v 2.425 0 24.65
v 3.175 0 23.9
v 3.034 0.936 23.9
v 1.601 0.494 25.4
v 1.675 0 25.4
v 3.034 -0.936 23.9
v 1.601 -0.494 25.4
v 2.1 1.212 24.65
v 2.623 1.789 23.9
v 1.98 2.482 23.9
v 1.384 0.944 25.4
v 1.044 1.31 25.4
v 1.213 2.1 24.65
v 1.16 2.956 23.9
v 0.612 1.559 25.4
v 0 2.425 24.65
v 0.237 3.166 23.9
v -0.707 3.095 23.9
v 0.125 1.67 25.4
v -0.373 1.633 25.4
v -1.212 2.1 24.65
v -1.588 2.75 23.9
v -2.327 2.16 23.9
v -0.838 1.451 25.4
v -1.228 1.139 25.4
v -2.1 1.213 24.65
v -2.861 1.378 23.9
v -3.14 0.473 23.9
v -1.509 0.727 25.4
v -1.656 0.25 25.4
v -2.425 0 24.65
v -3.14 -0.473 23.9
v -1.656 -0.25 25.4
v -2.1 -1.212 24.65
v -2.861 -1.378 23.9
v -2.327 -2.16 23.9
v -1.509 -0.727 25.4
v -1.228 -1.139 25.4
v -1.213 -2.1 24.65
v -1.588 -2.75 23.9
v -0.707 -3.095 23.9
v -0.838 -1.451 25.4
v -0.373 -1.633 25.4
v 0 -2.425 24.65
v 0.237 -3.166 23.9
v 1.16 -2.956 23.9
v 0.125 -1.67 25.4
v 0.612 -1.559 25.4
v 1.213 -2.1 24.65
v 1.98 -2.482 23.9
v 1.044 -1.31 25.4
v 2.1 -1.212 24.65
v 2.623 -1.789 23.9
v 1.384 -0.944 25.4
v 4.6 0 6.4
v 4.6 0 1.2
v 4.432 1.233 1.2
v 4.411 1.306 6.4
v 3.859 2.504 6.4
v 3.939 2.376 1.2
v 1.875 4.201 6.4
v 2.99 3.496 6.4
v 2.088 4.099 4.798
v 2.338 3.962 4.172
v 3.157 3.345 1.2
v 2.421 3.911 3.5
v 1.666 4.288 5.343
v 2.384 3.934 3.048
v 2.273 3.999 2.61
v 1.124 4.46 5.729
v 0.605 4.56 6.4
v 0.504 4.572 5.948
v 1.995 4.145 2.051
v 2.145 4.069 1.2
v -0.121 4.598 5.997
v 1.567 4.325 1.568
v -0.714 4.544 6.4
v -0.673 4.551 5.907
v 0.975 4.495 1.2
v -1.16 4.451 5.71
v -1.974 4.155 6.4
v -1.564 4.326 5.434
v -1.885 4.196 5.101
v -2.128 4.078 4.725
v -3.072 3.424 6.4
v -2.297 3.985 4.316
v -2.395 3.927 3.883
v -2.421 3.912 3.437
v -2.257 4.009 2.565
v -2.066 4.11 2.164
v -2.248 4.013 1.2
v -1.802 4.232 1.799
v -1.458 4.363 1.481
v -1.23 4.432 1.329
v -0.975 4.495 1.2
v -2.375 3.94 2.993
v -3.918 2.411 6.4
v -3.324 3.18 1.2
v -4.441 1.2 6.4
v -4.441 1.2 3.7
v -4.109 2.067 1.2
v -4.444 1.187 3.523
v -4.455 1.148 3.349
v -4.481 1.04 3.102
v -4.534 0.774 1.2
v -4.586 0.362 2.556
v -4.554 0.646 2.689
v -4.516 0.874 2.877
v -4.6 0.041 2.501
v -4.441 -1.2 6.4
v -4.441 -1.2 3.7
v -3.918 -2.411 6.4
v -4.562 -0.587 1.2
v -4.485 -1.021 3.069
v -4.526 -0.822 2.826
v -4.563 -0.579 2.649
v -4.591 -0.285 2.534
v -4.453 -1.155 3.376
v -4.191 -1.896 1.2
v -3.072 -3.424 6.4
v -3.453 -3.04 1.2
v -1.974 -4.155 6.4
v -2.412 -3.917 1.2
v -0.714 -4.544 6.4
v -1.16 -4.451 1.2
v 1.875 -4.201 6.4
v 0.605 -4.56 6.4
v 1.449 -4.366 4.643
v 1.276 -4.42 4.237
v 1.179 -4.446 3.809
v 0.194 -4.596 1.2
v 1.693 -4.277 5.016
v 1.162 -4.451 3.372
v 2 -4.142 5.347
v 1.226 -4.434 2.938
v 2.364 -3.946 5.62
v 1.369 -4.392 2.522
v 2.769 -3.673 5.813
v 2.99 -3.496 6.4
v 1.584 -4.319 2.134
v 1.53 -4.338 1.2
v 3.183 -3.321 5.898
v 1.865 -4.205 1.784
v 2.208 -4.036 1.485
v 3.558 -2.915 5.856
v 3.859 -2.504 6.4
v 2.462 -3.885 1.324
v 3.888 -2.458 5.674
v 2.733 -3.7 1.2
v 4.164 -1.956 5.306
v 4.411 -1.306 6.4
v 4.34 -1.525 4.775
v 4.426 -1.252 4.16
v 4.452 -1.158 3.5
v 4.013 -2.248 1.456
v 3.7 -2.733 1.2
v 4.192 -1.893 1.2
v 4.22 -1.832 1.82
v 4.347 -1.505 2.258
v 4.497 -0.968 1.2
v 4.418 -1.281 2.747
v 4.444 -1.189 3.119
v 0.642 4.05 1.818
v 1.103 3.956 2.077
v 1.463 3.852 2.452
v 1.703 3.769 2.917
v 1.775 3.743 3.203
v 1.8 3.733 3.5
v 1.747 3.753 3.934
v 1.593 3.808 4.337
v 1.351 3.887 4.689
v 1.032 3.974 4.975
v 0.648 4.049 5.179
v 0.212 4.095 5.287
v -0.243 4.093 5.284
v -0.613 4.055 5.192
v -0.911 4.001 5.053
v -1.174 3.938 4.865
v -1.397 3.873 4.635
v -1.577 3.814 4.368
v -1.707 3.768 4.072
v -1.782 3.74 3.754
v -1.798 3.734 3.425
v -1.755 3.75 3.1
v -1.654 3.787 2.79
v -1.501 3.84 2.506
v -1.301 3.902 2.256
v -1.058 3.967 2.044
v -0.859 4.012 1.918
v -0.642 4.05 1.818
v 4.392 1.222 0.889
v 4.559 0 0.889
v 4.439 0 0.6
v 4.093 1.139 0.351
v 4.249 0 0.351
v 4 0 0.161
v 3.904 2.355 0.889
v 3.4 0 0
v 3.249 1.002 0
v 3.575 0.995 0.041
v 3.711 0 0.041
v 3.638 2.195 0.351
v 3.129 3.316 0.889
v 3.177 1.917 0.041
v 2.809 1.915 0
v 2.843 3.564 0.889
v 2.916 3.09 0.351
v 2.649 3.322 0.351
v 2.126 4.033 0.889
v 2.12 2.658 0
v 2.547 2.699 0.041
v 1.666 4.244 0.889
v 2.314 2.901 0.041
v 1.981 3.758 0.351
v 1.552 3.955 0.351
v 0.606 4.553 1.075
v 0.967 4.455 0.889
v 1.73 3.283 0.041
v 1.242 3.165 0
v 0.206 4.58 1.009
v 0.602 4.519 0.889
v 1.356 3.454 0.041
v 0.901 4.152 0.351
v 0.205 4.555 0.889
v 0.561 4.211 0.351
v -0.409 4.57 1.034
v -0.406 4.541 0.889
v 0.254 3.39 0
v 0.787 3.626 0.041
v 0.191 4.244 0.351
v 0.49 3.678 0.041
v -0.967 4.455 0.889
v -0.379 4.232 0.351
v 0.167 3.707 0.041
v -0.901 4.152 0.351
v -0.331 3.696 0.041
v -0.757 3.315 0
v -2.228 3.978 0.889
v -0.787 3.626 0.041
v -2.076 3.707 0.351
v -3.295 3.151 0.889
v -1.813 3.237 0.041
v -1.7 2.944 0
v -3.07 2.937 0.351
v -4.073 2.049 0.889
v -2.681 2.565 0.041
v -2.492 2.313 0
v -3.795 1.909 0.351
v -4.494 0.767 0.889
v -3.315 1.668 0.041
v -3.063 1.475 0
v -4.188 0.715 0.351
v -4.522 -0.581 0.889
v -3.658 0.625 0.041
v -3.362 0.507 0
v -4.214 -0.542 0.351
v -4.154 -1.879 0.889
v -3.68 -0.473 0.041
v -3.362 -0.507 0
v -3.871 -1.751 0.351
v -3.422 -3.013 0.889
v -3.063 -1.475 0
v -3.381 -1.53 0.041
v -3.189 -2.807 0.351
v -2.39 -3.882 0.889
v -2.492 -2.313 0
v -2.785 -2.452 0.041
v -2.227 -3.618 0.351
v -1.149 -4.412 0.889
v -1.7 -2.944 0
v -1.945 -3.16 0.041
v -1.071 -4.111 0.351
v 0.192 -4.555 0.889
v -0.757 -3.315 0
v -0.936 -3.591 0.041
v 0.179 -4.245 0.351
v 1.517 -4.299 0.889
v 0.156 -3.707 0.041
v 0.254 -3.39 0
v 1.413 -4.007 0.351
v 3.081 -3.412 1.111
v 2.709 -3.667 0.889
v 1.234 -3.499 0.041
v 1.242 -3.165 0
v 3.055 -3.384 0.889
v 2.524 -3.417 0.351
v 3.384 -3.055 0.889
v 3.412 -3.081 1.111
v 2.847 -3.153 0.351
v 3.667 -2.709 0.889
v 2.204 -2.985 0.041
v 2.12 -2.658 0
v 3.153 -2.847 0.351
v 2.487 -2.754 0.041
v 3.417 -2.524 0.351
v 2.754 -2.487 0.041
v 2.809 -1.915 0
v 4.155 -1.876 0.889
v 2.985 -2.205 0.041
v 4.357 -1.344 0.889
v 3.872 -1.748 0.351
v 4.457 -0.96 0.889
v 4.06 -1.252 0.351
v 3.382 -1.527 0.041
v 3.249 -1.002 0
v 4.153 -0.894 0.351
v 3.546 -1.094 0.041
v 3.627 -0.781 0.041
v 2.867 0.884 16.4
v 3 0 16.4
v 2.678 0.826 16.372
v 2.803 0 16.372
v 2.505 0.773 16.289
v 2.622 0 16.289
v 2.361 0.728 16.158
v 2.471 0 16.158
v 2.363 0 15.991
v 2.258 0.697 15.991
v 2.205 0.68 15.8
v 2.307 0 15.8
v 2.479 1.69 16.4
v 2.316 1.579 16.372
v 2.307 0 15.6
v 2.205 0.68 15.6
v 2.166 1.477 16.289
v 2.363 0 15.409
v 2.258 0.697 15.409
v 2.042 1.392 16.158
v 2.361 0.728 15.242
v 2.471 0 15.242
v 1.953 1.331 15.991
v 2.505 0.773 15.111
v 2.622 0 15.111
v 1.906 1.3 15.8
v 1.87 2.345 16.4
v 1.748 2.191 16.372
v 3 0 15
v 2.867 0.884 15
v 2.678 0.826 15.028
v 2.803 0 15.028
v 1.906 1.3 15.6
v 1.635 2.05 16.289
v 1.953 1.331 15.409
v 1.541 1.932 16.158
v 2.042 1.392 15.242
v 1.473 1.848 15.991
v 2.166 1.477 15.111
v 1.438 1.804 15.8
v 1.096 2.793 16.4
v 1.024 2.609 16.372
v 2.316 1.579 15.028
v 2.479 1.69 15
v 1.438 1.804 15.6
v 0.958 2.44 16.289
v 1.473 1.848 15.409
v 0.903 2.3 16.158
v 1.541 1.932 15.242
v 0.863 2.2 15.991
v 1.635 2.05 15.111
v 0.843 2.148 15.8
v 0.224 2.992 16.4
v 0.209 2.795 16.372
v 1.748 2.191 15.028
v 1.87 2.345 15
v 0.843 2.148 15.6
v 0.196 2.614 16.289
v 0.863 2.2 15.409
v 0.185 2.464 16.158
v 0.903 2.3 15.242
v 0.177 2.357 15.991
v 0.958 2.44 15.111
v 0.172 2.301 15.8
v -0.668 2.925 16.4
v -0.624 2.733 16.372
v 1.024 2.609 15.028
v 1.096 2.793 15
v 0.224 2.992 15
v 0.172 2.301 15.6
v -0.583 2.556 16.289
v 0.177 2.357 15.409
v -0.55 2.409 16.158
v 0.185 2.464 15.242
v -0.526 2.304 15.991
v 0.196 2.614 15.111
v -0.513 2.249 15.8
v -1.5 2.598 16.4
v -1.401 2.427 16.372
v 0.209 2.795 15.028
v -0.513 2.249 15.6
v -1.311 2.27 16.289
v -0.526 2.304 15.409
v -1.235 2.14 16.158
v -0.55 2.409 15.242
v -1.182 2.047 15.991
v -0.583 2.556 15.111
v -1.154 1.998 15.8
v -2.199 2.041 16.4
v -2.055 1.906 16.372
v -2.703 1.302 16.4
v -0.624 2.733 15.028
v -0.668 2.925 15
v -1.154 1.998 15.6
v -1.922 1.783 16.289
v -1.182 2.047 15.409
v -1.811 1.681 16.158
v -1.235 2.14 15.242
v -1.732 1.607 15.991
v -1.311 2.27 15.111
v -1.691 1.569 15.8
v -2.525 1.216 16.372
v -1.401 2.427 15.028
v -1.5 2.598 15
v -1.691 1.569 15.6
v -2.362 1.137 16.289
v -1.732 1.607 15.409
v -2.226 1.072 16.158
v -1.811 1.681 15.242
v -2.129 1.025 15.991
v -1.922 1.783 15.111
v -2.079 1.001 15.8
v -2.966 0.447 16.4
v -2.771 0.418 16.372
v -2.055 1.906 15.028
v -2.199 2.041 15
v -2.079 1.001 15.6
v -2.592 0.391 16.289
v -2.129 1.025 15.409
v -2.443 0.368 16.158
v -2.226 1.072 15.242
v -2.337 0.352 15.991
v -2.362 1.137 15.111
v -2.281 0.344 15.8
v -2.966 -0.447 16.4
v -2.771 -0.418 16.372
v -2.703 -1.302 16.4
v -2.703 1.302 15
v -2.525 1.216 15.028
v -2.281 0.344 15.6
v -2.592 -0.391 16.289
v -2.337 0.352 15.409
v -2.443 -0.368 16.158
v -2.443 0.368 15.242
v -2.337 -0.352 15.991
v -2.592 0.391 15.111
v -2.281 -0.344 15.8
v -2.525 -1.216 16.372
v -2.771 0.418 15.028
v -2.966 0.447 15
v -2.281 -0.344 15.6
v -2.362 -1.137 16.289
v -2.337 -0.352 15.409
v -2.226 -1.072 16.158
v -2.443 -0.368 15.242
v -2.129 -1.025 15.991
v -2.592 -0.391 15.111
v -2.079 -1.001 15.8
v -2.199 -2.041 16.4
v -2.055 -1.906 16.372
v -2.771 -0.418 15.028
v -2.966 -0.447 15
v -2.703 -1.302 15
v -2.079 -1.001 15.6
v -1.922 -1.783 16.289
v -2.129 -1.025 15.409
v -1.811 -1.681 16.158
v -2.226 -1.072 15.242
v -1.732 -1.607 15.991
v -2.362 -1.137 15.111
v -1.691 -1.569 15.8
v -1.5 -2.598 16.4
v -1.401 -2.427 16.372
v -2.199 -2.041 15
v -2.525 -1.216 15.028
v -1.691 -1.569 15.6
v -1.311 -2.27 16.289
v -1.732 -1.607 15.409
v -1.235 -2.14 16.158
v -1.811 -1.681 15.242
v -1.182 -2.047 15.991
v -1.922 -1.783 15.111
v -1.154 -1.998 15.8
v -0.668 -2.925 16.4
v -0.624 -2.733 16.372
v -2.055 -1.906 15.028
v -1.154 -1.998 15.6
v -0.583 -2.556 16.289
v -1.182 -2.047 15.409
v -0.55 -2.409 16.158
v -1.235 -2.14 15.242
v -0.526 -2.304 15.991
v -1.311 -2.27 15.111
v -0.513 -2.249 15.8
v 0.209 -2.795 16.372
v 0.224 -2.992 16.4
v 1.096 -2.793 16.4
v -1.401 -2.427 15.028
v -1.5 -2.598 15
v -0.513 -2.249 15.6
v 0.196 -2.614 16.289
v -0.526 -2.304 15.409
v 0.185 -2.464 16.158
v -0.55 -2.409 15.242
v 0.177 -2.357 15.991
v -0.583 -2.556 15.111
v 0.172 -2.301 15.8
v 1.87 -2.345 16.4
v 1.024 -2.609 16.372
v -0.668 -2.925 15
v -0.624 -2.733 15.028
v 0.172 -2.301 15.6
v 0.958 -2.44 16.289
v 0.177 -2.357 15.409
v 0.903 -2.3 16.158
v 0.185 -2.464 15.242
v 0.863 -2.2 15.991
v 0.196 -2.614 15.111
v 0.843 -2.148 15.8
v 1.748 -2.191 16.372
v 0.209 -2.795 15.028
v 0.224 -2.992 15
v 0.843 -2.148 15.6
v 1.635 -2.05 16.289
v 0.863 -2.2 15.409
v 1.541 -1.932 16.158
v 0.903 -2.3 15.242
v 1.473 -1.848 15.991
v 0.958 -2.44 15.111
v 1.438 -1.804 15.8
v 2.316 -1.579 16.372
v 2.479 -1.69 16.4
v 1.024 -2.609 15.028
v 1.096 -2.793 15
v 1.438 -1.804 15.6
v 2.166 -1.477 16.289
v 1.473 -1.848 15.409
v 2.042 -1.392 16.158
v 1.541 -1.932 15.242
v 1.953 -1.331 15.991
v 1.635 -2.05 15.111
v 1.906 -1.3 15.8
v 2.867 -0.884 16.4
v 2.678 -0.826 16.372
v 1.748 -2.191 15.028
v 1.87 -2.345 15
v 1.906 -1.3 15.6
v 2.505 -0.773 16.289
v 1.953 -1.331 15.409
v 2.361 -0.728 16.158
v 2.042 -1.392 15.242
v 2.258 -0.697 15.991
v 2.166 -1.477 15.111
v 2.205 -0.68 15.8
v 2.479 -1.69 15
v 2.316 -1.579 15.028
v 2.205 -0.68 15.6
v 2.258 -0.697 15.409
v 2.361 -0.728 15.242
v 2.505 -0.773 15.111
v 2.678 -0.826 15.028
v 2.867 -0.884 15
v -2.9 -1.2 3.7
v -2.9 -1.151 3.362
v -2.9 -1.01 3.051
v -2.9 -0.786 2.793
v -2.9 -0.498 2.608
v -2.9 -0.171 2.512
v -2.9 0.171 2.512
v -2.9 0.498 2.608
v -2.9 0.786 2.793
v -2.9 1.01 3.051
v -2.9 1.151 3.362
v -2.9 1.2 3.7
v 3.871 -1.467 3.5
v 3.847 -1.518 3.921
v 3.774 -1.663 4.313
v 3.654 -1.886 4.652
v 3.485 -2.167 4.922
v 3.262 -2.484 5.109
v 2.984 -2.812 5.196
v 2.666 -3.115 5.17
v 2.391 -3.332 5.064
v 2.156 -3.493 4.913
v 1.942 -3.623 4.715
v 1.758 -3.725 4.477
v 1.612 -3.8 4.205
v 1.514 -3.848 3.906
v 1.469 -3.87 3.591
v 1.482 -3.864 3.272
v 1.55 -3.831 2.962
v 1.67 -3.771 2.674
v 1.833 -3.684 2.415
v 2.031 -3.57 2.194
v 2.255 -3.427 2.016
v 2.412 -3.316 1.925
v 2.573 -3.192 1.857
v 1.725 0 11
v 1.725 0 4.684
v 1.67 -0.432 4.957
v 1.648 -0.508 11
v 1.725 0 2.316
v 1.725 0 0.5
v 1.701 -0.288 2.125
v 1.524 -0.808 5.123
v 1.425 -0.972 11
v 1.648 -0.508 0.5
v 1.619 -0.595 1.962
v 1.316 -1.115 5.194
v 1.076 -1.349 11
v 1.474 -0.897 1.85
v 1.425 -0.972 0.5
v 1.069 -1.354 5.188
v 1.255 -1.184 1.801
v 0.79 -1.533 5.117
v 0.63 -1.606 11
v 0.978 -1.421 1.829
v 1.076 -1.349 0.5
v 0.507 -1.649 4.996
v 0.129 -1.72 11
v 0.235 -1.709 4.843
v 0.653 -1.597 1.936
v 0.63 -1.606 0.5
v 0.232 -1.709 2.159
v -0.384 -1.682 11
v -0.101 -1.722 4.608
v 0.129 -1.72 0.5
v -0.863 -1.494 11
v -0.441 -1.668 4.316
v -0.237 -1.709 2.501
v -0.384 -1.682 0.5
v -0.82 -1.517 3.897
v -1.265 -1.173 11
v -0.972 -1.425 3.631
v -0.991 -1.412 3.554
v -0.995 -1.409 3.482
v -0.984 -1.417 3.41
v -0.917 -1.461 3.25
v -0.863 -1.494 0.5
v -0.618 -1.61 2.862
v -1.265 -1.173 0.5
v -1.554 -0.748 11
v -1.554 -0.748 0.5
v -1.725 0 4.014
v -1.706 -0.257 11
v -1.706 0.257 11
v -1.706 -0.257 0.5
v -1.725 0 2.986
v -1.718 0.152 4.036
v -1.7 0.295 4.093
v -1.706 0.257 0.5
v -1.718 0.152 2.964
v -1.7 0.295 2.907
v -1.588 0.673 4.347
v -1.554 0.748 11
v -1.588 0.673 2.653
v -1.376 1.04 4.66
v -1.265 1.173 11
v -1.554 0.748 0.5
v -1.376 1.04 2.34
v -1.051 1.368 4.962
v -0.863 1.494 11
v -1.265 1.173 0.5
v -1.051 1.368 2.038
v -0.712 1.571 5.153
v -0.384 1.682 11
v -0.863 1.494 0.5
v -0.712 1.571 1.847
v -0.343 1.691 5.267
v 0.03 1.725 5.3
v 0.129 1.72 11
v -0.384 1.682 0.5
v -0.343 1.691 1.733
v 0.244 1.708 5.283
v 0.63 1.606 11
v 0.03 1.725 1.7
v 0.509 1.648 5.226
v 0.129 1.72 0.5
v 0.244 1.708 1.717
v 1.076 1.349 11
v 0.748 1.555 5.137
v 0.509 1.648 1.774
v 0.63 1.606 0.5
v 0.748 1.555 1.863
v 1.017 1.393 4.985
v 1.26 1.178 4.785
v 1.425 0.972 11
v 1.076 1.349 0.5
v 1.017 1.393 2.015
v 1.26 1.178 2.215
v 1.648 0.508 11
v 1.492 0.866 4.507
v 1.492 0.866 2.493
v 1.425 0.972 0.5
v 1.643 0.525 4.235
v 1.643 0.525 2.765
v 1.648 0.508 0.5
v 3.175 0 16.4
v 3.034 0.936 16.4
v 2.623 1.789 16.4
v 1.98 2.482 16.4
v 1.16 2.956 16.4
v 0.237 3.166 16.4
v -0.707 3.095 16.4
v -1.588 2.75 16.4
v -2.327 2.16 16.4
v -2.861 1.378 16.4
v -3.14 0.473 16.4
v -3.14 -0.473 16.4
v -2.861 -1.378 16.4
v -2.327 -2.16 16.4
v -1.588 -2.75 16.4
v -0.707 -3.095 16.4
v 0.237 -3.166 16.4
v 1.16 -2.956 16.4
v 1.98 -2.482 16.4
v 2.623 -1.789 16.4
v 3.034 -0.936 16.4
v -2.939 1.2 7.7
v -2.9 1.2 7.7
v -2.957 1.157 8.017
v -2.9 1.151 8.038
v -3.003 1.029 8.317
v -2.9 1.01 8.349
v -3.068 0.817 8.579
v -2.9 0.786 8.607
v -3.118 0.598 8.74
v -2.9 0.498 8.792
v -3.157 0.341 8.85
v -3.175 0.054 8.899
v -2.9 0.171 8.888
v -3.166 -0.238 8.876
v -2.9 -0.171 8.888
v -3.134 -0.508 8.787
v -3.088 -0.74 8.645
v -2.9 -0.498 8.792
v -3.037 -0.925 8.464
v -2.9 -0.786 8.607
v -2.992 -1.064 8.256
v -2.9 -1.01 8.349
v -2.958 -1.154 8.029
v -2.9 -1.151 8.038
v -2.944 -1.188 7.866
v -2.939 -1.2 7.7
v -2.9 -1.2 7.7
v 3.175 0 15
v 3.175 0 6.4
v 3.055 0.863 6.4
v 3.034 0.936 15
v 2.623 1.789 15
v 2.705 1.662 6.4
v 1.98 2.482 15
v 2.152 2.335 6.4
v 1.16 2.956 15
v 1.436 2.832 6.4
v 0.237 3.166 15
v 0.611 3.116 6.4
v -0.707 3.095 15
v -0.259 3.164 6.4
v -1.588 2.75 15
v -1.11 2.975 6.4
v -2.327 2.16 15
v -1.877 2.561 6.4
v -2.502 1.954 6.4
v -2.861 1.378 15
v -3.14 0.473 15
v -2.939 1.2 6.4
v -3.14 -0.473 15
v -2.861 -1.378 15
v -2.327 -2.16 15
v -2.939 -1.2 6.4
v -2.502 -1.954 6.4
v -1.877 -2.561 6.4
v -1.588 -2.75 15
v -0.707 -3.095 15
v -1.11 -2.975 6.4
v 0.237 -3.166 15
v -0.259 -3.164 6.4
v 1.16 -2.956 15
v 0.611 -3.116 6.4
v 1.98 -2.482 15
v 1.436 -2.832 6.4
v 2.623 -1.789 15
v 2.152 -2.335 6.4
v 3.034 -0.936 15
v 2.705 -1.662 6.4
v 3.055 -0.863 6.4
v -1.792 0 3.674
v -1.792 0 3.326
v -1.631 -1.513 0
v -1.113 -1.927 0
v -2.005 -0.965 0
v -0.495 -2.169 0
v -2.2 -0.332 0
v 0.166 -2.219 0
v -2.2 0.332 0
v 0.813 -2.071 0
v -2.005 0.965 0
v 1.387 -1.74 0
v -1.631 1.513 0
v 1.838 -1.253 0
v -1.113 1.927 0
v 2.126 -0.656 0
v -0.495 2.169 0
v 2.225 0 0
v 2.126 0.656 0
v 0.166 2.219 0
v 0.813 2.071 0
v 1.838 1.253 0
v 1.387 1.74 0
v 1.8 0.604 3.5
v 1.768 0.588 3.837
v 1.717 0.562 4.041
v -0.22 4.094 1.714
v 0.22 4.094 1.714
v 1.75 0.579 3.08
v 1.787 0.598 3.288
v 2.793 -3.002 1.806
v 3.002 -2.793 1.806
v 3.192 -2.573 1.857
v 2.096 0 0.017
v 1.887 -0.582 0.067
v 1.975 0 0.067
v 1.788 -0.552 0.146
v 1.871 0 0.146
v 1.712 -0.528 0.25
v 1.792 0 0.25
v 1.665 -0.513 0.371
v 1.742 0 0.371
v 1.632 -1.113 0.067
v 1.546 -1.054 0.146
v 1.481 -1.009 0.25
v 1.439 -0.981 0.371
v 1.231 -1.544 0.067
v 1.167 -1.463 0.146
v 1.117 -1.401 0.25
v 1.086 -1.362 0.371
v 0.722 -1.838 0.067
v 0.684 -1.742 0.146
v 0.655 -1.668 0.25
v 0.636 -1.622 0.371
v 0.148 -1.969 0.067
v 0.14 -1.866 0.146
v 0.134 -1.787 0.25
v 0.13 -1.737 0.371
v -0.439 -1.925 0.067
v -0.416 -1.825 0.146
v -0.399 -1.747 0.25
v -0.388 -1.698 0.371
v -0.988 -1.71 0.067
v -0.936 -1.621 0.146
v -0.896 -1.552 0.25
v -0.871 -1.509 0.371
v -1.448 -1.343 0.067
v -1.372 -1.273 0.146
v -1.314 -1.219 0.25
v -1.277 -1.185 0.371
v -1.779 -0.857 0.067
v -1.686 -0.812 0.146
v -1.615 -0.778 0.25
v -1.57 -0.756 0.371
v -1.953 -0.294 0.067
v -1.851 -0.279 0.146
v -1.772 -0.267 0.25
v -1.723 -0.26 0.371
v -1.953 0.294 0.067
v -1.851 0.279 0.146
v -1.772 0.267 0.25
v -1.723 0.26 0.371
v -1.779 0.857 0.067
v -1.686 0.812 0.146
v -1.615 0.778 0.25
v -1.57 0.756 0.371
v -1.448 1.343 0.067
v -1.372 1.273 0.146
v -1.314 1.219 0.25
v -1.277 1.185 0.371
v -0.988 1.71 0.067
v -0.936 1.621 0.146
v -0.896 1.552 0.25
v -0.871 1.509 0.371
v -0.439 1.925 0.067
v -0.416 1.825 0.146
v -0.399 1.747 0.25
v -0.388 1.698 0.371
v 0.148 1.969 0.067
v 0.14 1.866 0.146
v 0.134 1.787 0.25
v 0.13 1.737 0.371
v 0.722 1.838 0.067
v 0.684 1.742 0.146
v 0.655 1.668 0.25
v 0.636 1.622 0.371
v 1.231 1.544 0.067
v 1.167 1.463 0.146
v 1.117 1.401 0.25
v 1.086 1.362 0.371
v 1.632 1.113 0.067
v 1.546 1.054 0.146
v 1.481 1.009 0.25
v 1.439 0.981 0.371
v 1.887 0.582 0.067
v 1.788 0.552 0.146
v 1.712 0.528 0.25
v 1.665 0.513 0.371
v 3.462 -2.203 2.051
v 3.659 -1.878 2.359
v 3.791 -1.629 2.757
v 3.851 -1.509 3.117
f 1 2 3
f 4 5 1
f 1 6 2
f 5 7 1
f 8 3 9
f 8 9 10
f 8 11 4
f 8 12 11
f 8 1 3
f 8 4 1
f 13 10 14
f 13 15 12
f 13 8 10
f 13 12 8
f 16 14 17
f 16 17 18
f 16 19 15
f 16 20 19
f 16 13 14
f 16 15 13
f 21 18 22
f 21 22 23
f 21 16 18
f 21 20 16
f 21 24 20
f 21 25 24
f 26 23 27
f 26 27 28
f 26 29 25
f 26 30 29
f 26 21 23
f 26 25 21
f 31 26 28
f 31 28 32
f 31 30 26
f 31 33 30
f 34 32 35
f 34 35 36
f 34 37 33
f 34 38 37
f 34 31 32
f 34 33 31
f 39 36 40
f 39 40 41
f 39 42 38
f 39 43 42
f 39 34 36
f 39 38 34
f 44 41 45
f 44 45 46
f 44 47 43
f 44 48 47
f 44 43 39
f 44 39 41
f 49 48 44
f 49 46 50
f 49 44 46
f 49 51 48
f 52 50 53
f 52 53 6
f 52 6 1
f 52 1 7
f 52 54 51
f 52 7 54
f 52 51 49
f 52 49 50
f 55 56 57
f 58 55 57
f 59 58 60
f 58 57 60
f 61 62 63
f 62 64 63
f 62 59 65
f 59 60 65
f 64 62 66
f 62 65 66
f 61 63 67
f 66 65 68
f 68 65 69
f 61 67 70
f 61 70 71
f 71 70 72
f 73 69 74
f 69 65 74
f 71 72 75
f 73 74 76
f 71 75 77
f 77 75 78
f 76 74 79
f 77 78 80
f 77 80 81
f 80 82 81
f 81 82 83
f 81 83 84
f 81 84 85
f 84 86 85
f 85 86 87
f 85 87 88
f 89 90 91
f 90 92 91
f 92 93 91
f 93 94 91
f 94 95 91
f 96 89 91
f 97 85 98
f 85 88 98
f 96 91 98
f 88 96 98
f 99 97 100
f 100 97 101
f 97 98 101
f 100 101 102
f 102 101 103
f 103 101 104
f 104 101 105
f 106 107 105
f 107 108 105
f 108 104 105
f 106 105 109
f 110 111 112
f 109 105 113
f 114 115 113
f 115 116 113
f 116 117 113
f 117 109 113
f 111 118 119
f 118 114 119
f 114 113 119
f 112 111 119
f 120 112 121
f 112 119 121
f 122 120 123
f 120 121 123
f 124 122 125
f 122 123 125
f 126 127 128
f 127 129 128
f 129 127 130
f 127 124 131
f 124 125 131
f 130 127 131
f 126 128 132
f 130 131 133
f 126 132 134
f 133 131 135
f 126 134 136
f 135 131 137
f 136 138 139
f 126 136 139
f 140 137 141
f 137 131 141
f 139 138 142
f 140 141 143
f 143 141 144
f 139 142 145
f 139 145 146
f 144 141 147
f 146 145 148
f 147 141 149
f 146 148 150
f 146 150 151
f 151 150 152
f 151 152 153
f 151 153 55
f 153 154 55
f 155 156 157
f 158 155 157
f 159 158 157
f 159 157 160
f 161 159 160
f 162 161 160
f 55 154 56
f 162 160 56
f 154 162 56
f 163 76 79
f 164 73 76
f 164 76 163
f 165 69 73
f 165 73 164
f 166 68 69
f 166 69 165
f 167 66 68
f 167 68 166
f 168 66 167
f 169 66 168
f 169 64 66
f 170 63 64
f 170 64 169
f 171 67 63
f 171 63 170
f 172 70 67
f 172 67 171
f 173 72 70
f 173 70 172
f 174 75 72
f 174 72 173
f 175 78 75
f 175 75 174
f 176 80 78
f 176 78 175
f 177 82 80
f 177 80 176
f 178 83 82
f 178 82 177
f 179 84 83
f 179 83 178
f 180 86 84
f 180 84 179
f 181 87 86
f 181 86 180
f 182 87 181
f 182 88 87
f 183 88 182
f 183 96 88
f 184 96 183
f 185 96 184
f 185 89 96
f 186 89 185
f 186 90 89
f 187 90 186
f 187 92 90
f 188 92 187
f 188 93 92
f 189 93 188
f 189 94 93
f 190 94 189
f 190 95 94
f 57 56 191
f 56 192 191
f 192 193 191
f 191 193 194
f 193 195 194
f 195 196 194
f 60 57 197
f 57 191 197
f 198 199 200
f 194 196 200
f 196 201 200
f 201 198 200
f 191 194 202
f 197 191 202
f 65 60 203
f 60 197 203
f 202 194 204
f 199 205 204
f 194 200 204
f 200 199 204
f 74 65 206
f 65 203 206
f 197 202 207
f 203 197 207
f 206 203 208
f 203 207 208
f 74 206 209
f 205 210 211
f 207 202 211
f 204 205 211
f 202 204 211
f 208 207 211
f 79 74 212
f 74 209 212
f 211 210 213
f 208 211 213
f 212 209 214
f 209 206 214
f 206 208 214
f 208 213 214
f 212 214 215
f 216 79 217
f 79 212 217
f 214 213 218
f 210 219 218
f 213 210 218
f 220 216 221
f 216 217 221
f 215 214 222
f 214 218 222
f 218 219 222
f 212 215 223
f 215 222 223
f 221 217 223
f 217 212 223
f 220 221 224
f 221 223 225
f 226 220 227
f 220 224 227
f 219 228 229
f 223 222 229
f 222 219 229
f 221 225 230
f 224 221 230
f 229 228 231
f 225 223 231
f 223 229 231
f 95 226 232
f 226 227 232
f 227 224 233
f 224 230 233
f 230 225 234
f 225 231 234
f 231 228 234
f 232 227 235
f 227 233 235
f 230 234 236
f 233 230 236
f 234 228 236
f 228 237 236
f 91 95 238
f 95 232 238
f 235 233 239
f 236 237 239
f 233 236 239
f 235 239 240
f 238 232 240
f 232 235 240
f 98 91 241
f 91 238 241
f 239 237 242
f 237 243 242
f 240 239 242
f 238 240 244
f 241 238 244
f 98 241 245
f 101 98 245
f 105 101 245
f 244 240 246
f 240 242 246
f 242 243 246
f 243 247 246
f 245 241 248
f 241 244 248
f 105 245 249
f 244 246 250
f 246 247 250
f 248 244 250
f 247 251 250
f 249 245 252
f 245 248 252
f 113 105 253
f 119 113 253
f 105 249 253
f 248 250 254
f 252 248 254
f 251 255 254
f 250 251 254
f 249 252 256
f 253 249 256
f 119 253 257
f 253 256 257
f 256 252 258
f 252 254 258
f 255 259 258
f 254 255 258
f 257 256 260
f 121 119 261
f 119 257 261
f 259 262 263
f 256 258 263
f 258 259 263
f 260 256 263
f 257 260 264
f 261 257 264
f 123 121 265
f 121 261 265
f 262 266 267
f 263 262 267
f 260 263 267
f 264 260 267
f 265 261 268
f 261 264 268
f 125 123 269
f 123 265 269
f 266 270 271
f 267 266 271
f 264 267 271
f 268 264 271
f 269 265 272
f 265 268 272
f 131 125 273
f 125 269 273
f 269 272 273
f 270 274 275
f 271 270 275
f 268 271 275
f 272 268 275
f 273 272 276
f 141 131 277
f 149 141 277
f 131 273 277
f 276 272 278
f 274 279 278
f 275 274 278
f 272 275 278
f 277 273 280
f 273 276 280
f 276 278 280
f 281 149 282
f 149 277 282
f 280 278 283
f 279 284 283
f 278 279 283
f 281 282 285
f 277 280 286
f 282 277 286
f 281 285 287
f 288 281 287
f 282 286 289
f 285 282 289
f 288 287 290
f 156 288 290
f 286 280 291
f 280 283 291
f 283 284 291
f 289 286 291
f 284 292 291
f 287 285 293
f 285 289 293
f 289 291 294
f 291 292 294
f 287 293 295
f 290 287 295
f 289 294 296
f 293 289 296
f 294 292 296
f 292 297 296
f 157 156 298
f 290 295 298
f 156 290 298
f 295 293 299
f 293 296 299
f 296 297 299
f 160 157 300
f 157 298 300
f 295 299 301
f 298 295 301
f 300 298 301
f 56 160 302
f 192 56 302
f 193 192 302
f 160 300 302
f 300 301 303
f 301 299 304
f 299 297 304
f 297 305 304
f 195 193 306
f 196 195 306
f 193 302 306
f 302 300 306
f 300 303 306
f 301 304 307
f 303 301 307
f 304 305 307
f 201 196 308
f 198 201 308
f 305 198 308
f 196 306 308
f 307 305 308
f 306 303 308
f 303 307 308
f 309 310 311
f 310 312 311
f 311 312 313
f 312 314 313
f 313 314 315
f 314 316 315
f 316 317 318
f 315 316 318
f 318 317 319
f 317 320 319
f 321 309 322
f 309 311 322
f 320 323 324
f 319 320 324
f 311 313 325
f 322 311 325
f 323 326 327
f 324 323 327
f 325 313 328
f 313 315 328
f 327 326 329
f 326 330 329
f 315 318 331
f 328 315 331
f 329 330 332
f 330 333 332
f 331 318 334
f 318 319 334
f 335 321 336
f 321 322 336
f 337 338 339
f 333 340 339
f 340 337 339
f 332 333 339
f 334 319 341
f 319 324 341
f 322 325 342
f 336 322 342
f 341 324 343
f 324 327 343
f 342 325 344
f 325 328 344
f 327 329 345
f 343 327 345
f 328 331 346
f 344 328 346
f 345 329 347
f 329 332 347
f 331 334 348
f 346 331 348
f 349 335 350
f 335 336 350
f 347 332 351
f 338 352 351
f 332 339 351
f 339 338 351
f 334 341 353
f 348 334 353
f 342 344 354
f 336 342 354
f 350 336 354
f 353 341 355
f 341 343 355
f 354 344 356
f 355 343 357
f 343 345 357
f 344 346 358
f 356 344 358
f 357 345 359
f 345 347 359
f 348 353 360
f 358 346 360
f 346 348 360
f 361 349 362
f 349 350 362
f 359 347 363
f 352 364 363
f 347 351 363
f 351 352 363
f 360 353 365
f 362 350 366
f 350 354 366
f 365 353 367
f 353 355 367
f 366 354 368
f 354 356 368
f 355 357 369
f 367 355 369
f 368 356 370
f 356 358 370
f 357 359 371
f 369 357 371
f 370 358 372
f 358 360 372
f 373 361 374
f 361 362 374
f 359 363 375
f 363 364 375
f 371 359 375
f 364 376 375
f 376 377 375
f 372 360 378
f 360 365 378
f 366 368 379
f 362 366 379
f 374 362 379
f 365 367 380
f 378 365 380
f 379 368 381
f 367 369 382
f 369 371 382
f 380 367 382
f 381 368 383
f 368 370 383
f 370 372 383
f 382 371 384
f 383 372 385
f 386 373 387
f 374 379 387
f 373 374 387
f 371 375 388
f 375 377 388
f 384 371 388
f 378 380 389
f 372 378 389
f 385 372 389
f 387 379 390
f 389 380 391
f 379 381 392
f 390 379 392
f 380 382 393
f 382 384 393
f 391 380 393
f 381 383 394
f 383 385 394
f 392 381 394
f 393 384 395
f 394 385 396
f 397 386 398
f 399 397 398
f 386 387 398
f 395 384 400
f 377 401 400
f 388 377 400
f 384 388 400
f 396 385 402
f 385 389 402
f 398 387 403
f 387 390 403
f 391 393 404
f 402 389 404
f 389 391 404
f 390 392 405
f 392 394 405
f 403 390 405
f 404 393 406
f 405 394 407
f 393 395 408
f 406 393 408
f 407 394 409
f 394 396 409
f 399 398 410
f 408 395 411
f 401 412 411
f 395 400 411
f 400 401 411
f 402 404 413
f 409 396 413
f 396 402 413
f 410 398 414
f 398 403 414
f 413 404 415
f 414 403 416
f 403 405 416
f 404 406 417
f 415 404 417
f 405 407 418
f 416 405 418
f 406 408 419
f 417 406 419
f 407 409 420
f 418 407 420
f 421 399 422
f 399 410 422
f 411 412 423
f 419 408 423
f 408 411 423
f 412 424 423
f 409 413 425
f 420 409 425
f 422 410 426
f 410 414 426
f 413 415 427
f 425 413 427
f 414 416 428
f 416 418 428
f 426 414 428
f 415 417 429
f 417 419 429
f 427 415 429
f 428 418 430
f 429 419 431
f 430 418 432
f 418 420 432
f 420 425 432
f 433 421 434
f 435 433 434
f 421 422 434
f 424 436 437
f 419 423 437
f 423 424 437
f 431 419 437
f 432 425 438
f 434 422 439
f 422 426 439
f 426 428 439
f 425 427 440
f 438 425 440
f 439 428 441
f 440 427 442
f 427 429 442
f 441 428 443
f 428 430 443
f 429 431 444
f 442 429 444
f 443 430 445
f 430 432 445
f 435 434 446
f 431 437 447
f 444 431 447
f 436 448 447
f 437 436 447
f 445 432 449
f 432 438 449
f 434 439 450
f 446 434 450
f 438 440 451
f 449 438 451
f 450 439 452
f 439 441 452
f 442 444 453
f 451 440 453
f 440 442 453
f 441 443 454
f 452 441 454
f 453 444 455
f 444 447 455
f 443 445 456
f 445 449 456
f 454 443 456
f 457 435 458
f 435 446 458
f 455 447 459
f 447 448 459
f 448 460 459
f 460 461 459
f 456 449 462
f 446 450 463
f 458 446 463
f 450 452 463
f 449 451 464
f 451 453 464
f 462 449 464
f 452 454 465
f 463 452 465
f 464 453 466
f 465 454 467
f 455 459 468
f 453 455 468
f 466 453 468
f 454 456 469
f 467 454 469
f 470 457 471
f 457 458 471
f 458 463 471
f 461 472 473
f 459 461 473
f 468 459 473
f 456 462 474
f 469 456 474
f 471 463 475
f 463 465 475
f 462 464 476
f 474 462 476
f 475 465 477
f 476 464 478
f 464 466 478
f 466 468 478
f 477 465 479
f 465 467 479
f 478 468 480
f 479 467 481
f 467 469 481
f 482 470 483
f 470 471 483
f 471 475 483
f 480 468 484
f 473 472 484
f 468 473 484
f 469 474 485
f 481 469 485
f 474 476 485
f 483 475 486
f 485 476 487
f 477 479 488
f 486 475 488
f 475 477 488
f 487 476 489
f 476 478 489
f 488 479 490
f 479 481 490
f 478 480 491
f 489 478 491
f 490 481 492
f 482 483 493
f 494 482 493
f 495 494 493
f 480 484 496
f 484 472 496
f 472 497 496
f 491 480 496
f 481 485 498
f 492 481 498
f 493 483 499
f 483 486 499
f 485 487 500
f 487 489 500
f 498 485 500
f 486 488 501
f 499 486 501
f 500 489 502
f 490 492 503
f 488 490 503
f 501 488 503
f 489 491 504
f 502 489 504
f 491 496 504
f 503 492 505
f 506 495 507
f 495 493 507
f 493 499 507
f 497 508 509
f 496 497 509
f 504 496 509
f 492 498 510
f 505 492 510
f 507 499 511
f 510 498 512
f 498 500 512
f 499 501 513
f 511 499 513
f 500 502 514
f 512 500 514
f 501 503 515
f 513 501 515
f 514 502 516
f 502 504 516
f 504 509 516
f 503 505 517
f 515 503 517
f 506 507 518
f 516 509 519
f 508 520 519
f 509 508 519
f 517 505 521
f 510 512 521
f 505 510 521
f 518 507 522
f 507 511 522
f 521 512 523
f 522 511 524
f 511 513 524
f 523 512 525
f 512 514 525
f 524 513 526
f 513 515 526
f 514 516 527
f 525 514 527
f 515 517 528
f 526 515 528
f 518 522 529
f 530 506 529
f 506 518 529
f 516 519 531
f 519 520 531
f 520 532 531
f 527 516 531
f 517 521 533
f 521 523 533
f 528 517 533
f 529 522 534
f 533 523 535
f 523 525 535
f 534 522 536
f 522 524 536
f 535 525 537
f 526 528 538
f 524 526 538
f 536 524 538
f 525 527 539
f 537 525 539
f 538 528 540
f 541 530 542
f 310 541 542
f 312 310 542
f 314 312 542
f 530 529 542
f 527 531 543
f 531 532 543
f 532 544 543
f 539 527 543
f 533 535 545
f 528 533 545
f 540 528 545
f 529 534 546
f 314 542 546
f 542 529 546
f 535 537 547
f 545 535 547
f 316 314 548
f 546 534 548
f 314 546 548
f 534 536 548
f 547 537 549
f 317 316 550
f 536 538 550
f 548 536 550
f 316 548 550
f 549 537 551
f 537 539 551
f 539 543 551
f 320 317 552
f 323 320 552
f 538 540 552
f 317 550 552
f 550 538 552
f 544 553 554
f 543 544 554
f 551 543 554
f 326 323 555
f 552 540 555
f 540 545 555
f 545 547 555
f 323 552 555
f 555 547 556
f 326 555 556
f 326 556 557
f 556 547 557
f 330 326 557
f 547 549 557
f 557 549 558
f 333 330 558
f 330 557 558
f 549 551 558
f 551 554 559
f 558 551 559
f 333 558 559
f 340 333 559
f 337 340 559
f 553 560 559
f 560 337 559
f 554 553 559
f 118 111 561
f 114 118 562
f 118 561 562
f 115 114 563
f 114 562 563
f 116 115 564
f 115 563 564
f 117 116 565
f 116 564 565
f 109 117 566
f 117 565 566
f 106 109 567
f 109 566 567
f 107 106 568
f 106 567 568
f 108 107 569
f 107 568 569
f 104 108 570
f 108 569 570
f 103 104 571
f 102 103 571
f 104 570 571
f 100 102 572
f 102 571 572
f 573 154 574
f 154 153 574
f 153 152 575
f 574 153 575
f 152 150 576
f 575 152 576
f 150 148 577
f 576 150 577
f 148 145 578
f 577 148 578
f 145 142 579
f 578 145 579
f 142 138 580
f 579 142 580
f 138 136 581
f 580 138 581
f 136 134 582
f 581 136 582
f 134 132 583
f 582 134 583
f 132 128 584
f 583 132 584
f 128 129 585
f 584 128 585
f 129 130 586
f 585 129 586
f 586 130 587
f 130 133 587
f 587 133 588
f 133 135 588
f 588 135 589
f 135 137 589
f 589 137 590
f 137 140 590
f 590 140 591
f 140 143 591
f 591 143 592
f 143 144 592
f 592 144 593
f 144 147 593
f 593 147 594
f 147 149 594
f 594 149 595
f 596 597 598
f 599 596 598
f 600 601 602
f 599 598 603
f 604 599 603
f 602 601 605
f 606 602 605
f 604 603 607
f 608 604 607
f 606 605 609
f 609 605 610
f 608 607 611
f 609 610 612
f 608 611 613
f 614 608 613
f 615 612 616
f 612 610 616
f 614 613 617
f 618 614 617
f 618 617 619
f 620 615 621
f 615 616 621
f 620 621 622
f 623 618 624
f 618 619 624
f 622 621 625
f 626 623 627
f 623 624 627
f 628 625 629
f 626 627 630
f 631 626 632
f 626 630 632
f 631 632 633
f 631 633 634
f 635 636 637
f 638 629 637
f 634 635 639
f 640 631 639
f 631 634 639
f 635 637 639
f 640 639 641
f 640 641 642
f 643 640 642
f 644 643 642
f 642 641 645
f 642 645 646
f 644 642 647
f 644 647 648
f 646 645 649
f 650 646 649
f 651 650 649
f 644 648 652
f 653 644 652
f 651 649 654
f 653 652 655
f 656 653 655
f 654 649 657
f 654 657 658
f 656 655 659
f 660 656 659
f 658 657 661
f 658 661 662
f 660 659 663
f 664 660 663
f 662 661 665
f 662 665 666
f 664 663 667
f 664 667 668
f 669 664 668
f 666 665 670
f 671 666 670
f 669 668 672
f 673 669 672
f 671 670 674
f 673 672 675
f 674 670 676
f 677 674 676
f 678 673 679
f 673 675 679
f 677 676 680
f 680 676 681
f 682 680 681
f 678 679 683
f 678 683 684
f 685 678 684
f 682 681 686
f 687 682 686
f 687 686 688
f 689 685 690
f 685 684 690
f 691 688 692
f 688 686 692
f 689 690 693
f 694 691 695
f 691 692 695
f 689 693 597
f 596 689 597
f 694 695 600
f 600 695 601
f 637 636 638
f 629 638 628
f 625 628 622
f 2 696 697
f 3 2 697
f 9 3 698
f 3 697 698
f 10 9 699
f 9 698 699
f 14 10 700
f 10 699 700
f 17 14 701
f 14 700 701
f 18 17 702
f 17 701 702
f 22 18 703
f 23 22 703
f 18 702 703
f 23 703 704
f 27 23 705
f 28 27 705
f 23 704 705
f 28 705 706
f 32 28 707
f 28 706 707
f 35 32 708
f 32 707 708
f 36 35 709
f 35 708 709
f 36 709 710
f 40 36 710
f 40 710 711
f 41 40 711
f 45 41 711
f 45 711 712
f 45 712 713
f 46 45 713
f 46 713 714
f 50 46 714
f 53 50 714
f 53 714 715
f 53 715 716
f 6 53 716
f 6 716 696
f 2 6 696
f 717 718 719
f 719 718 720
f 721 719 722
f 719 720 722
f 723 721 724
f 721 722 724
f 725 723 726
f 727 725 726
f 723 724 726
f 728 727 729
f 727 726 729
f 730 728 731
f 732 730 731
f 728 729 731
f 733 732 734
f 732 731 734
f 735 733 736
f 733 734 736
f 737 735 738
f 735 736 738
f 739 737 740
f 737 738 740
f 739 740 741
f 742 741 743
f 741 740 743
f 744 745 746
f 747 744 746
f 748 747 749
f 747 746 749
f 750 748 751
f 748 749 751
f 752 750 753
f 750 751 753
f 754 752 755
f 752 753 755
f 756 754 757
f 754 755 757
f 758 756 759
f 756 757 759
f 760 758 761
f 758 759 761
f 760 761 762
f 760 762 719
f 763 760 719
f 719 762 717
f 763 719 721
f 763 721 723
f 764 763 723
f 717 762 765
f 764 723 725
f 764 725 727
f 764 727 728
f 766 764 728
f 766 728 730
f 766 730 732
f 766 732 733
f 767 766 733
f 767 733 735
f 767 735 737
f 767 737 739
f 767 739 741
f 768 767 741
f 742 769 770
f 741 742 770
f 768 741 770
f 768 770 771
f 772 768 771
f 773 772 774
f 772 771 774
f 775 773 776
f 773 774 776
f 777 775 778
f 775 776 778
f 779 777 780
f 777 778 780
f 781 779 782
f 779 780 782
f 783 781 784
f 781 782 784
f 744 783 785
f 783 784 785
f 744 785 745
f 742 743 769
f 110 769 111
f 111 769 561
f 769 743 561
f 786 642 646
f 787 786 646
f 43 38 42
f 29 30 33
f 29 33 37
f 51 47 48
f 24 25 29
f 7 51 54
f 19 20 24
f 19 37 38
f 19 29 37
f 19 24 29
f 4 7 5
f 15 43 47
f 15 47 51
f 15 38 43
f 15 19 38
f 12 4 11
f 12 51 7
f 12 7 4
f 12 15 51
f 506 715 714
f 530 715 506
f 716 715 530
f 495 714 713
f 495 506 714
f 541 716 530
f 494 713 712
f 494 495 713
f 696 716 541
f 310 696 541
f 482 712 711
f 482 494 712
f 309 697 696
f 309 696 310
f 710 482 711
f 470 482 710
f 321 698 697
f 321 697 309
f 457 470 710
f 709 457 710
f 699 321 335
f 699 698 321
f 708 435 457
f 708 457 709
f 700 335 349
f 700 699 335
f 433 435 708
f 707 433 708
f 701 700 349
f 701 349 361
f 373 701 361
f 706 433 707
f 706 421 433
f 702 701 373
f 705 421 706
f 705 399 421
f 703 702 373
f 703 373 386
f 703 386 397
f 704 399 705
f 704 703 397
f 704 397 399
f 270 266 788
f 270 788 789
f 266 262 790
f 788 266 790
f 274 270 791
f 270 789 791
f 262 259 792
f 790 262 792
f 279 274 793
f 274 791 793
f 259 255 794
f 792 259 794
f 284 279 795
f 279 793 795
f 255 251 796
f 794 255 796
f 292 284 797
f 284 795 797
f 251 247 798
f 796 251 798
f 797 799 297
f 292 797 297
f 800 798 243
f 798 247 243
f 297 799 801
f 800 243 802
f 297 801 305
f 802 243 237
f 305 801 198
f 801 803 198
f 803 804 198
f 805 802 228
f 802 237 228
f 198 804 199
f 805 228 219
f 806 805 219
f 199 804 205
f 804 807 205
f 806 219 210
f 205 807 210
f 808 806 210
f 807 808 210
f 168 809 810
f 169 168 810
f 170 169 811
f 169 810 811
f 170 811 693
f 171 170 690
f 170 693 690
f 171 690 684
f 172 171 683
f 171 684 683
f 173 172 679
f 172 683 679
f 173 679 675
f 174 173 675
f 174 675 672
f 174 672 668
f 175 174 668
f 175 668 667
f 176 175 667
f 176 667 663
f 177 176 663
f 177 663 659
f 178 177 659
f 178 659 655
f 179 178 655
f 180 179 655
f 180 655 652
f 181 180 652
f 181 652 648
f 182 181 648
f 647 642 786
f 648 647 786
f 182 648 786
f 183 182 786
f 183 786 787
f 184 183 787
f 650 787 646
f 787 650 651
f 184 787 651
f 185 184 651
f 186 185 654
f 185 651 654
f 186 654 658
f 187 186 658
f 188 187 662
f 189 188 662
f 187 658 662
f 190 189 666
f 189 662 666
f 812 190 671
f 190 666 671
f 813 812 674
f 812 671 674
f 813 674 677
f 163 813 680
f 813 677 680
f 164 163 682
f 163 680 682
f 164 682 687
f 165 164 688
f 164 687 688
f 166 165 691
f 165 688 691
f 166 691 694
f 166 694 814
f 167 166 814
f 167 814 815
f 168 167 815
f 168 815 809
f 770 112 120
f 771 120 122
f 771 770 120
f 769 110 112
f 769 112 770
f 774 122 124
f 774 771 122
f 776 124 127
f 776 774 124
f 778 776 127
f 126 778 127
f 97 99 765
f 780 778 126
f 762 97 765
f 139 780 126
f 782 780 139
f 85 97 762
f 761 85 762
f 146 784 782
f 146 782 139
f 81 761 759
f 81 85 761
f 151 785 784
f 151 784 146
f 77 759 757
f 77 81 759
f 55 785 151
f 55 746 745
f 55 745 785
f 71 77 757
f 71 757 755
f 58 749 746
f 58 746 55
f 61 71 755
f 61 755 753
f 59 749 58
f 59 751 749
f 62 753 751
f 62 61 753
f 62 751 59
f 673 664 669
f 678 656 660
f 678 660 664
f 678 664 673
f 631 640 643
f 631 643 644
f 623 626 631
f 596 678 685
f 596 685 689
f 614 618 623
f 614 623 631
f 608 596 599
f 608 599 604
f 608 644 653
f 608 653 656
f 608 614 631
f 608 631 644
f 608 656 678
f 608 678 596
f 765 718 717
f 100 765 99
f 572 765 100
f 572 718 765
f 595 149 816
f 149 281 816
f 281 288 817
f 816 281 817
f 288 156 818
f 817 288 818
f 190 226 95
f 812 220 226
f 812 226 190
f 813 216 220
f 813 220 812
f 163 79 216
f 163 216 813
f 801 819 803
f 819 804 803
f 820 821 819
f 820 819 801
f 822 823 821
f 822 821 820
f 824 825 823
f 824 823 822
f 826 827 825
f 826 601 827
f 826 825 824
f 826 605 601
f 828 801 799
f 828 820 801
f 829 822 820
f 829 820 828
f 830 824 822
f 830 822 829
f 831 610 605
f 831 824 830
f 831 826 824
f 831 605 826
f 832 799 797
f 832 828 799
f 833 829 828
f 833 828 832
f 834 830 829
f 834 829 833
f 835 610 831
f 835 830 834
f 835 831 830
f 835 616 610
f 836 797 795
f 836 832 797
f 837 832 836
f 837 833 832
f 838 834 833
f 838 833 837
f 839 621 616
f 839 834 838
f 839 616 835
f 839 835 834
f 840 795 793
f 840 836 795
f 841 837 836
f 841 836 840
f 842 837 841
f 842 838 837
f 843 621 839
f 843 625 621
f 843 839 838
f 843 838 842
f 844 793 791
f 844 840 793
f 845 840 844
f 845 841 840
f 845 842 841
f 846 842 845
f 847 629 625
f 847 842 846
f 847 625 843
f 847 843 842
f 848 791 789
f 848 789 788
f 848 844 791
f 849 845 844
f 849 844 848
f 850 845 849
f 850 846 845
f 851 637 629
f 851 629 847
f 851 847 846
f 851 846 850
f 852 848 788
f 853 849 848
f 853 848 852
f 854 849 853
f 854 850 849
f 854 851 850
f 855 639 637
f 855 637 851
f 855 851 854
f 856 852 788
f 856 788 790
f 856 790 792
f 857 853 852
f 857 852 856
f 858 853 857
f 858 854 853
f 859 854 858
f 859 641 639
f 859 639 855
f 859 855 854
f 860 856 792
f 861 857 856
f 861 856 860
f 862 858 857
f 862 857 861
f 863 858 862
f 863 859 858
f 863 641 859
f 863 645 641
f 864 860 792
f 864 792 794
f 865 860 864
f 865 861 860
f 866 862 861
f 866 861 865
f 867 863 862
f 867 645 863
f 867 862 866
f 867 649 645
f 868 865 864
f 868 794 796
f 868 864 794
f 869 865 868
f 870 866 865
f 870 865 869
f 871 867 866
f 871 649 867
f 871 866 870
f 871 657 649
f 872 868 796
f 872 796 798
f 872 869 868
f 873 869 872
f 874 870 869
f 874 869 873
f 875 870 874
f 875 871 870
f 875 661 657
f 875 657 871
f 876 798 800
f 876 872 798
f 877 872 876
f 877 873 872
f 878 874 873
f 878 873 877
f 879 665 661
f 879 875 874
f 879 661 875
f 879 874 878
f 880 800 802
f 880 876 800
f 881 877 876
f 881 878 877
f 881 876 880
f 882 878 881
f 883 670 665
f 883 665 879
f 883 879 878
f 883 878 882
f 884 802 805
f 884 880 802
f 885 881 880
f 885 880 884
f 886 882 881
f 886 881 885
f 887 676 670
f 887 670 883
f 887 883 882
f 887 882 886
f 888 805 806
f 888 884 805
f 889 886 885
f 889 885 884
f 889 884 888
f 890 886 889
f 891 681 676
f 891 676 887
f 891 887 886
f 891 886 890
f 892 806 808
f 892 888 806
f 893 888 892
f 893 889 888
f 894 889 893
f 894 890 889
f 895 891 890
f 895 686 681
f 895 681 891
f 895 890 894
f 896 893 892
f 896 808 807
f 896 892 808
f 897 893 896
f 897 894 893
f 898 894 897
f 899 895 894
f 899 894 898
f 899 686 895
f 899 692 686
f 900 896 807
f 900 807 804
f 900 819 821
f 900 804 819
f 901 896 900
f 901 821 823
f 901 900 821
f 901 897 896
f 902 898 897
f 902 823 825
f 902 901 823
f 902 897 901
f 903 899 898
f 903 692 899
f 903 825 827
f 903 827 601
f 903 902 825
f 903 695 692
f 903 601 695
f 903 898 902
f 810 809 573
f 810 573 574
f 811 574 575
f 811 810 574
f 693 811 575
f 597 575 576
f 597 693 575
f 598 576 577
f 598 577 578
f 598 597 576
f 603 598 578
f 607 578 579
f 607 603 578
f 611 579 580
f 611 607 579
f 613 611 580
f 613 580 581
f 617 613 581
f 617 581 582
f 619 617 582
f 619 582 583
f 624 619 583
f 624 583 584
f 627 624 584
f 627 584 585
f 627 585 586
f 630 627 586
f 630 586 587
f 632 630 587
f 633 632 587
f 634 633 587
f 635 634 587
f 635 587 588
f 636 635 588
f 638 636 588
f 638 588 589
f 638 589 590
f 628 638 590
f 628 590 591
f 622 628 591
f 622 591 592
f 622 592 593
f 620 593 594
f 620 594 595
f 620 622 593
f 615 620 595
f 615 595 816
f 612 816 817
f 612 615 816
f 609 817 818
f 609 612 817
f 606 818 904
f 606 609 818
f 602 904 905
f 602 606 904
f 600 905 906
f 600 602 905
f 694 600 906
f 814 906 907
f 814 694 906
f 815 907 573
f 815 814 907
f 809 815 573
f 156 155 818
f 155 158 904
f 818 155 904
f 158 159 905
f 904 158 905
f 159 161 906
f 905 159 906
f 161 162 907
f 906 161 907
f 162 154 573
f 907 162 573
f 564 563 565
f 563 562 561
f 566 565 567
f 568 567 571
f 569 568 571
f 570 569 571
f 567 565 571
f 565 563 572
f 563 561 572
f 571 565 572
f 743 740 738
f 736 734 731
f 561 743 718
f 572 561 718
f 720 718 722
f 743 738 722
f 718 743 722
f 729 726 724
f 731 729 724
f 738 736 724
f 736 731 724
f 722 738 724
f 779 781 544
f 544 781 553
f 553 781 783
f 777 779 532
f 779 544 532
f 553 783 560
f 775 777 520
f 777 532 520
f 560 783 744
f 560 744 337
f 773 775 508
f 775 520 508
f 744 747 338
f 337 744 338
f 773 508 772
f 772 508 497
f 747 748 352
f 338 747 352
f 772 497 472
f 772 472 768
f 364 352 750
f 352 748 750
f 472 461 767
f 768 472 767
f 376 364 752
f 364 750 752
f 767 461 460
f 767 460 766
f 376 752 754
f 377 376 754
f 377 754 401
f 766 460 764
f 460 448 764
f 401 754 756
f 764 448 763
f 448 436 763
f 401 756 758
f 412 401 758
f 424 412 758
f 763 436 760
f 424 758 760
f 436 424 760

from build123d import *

# Parameters (mm, degrees)
SKETCH_R         = 4.6
PAD_DEPTH        = 6.4
SKETCH001_R      = 3.175
PAD001_DEPTH     = 19
CHAMFER_SIZE     = 1.5
FILLET_R         = 1.2
SKETCH002_R      = 1.725
POCKET_DEPTH     = 11
FILLET001_R      = 0.5
SKETCH004_R      = 1.8
POCKET001_DEPTH  = 5
POCKET002_DEPTH  = 5
SKETCH006_R      = 1.7
POCKET003_DEPTH  = 5
CHAMFER001_SIZE2 = 0.5
CHAMFER001_SIZE  = 0.7


with BuildPart() as part:
    # Sketch → Pad (new body)
    with BuildSketch(Plane.XY):
        Circle(SKETCH_R)
    extrude(amount=PAD_DEPTH)

    # Sketch001 (on Face3 of Pad) → Pad001 (join)
    with BuildSketch(Plane.XY.offset(6.4)):
        Circle(SKETCH001_R)
    extrude(amount=PAD001_DEPTH)

    # Chamfer
    chamfer_edges = [part.edges().sort_by_distance(p)[0] for p in [
        (-3.175, 0, 25.4),
    ]]
    chamfer(chamfer_edges, length=CHAMFER_SIZE)

    # Fillet
    fillet_edges = [part.edges().sort_by_distance(p)[0] for p in [
        (-4.6, 0, 0),
    ]]
    fillet(fillet_edges, radius=FILLET_R)

    # Sketch002 (on Face4 of Fillet) → Pocket (cut)
    with BuildSketch(Plane(origin=(0, 0, 0), x_dir=(1, 0, 0), z_dir=(0, 0, -1))):
        Circle(SKETCH002_R)
    extrude(amount=-POCKET_DEPTH, mode=Mode.SUBTRACT)

    # Fillet001
    fillet001_edges = [part.edges().sort_by_distance(p)[0] for p in [
        (-1.725, 0, 0),
    ]]
    fillet(fillet001_edges, radius=FILLET001_R)

    # Sketch003 → Groove (revolve, cut)
    with BuildSketch(Plane.XZ):
        with BuildLine():
            ThreePointArc((3, 16.4), (2.3, 15.7), (3, 15))
            Line((3, 15), (4.410793, 15))
            Line((4.410793, 16.4), (4.410793, 15))
            Line((3, 16.4), (4.410793, 16.4))
        make_face()
    revolve(axis=Axis((0, 0, 0), (0, 0, 1)), mode=Mode.SUBTRACT)

    # Sketch004 → Pocket001 (cut)
    with BuildSketch(Plane.XZ):
        with Locations((0, 3.5)):
            Circle(SKETCH004_R)
    extrude(amount=-POCKET001_DEPTH, mode=Mode.SUBTRACT)

    # Sketch005 → Pocket002 (cut)
    with BuildSketch(Plane.YZ.offset(-2.9)):
        with BuildLine():
            ThreePointArc((1.2, 7.7), (0, 8.9), (-1.2, 7.7))
            Line((-1.2, 7.7), (-1.2, 3.7))
            ThreePointArc((-1.2, 3.7), (0, 2.5), (1.2, 3.7))
            Line((1.2, 7.7), (1.2, 3.7))
        make_face()
    extrude(amount=-POCKET002_DEPTH, mode=Mode.SUBTRACT)

    # Sketch006 → Pocket003 (cut)
    with BuildSketch(Plane(origin=(0, 0, 0), x_dir=(0.707107, 0.707107, 0), z_dir=(0.707107, -0.707107, 0))):
        with Locations((0, 3.5)):
            Circle(SKETCH006_R)
    extrude(amount=POCKET003_DEPTH, mode=Mode.SUBTRACT)

    # Chamfer001
    chamfer001_edges = [part.edges().sort_by_distance(p)[0] for p in [
        (1.820335, -4.224498, 3.5),
        (-1.8, 4.233202, 3.5),
    ]]
    chamfer001_side = part.faces().sort_by_distance((-4.6, 0, 1.340114))[0]
    chamfer(chamfer001_edges, length=CHAMFER001_SIZE, length2=CHAMFER001_SIZE2, reference=chamfer001_side)


solid = part.part
